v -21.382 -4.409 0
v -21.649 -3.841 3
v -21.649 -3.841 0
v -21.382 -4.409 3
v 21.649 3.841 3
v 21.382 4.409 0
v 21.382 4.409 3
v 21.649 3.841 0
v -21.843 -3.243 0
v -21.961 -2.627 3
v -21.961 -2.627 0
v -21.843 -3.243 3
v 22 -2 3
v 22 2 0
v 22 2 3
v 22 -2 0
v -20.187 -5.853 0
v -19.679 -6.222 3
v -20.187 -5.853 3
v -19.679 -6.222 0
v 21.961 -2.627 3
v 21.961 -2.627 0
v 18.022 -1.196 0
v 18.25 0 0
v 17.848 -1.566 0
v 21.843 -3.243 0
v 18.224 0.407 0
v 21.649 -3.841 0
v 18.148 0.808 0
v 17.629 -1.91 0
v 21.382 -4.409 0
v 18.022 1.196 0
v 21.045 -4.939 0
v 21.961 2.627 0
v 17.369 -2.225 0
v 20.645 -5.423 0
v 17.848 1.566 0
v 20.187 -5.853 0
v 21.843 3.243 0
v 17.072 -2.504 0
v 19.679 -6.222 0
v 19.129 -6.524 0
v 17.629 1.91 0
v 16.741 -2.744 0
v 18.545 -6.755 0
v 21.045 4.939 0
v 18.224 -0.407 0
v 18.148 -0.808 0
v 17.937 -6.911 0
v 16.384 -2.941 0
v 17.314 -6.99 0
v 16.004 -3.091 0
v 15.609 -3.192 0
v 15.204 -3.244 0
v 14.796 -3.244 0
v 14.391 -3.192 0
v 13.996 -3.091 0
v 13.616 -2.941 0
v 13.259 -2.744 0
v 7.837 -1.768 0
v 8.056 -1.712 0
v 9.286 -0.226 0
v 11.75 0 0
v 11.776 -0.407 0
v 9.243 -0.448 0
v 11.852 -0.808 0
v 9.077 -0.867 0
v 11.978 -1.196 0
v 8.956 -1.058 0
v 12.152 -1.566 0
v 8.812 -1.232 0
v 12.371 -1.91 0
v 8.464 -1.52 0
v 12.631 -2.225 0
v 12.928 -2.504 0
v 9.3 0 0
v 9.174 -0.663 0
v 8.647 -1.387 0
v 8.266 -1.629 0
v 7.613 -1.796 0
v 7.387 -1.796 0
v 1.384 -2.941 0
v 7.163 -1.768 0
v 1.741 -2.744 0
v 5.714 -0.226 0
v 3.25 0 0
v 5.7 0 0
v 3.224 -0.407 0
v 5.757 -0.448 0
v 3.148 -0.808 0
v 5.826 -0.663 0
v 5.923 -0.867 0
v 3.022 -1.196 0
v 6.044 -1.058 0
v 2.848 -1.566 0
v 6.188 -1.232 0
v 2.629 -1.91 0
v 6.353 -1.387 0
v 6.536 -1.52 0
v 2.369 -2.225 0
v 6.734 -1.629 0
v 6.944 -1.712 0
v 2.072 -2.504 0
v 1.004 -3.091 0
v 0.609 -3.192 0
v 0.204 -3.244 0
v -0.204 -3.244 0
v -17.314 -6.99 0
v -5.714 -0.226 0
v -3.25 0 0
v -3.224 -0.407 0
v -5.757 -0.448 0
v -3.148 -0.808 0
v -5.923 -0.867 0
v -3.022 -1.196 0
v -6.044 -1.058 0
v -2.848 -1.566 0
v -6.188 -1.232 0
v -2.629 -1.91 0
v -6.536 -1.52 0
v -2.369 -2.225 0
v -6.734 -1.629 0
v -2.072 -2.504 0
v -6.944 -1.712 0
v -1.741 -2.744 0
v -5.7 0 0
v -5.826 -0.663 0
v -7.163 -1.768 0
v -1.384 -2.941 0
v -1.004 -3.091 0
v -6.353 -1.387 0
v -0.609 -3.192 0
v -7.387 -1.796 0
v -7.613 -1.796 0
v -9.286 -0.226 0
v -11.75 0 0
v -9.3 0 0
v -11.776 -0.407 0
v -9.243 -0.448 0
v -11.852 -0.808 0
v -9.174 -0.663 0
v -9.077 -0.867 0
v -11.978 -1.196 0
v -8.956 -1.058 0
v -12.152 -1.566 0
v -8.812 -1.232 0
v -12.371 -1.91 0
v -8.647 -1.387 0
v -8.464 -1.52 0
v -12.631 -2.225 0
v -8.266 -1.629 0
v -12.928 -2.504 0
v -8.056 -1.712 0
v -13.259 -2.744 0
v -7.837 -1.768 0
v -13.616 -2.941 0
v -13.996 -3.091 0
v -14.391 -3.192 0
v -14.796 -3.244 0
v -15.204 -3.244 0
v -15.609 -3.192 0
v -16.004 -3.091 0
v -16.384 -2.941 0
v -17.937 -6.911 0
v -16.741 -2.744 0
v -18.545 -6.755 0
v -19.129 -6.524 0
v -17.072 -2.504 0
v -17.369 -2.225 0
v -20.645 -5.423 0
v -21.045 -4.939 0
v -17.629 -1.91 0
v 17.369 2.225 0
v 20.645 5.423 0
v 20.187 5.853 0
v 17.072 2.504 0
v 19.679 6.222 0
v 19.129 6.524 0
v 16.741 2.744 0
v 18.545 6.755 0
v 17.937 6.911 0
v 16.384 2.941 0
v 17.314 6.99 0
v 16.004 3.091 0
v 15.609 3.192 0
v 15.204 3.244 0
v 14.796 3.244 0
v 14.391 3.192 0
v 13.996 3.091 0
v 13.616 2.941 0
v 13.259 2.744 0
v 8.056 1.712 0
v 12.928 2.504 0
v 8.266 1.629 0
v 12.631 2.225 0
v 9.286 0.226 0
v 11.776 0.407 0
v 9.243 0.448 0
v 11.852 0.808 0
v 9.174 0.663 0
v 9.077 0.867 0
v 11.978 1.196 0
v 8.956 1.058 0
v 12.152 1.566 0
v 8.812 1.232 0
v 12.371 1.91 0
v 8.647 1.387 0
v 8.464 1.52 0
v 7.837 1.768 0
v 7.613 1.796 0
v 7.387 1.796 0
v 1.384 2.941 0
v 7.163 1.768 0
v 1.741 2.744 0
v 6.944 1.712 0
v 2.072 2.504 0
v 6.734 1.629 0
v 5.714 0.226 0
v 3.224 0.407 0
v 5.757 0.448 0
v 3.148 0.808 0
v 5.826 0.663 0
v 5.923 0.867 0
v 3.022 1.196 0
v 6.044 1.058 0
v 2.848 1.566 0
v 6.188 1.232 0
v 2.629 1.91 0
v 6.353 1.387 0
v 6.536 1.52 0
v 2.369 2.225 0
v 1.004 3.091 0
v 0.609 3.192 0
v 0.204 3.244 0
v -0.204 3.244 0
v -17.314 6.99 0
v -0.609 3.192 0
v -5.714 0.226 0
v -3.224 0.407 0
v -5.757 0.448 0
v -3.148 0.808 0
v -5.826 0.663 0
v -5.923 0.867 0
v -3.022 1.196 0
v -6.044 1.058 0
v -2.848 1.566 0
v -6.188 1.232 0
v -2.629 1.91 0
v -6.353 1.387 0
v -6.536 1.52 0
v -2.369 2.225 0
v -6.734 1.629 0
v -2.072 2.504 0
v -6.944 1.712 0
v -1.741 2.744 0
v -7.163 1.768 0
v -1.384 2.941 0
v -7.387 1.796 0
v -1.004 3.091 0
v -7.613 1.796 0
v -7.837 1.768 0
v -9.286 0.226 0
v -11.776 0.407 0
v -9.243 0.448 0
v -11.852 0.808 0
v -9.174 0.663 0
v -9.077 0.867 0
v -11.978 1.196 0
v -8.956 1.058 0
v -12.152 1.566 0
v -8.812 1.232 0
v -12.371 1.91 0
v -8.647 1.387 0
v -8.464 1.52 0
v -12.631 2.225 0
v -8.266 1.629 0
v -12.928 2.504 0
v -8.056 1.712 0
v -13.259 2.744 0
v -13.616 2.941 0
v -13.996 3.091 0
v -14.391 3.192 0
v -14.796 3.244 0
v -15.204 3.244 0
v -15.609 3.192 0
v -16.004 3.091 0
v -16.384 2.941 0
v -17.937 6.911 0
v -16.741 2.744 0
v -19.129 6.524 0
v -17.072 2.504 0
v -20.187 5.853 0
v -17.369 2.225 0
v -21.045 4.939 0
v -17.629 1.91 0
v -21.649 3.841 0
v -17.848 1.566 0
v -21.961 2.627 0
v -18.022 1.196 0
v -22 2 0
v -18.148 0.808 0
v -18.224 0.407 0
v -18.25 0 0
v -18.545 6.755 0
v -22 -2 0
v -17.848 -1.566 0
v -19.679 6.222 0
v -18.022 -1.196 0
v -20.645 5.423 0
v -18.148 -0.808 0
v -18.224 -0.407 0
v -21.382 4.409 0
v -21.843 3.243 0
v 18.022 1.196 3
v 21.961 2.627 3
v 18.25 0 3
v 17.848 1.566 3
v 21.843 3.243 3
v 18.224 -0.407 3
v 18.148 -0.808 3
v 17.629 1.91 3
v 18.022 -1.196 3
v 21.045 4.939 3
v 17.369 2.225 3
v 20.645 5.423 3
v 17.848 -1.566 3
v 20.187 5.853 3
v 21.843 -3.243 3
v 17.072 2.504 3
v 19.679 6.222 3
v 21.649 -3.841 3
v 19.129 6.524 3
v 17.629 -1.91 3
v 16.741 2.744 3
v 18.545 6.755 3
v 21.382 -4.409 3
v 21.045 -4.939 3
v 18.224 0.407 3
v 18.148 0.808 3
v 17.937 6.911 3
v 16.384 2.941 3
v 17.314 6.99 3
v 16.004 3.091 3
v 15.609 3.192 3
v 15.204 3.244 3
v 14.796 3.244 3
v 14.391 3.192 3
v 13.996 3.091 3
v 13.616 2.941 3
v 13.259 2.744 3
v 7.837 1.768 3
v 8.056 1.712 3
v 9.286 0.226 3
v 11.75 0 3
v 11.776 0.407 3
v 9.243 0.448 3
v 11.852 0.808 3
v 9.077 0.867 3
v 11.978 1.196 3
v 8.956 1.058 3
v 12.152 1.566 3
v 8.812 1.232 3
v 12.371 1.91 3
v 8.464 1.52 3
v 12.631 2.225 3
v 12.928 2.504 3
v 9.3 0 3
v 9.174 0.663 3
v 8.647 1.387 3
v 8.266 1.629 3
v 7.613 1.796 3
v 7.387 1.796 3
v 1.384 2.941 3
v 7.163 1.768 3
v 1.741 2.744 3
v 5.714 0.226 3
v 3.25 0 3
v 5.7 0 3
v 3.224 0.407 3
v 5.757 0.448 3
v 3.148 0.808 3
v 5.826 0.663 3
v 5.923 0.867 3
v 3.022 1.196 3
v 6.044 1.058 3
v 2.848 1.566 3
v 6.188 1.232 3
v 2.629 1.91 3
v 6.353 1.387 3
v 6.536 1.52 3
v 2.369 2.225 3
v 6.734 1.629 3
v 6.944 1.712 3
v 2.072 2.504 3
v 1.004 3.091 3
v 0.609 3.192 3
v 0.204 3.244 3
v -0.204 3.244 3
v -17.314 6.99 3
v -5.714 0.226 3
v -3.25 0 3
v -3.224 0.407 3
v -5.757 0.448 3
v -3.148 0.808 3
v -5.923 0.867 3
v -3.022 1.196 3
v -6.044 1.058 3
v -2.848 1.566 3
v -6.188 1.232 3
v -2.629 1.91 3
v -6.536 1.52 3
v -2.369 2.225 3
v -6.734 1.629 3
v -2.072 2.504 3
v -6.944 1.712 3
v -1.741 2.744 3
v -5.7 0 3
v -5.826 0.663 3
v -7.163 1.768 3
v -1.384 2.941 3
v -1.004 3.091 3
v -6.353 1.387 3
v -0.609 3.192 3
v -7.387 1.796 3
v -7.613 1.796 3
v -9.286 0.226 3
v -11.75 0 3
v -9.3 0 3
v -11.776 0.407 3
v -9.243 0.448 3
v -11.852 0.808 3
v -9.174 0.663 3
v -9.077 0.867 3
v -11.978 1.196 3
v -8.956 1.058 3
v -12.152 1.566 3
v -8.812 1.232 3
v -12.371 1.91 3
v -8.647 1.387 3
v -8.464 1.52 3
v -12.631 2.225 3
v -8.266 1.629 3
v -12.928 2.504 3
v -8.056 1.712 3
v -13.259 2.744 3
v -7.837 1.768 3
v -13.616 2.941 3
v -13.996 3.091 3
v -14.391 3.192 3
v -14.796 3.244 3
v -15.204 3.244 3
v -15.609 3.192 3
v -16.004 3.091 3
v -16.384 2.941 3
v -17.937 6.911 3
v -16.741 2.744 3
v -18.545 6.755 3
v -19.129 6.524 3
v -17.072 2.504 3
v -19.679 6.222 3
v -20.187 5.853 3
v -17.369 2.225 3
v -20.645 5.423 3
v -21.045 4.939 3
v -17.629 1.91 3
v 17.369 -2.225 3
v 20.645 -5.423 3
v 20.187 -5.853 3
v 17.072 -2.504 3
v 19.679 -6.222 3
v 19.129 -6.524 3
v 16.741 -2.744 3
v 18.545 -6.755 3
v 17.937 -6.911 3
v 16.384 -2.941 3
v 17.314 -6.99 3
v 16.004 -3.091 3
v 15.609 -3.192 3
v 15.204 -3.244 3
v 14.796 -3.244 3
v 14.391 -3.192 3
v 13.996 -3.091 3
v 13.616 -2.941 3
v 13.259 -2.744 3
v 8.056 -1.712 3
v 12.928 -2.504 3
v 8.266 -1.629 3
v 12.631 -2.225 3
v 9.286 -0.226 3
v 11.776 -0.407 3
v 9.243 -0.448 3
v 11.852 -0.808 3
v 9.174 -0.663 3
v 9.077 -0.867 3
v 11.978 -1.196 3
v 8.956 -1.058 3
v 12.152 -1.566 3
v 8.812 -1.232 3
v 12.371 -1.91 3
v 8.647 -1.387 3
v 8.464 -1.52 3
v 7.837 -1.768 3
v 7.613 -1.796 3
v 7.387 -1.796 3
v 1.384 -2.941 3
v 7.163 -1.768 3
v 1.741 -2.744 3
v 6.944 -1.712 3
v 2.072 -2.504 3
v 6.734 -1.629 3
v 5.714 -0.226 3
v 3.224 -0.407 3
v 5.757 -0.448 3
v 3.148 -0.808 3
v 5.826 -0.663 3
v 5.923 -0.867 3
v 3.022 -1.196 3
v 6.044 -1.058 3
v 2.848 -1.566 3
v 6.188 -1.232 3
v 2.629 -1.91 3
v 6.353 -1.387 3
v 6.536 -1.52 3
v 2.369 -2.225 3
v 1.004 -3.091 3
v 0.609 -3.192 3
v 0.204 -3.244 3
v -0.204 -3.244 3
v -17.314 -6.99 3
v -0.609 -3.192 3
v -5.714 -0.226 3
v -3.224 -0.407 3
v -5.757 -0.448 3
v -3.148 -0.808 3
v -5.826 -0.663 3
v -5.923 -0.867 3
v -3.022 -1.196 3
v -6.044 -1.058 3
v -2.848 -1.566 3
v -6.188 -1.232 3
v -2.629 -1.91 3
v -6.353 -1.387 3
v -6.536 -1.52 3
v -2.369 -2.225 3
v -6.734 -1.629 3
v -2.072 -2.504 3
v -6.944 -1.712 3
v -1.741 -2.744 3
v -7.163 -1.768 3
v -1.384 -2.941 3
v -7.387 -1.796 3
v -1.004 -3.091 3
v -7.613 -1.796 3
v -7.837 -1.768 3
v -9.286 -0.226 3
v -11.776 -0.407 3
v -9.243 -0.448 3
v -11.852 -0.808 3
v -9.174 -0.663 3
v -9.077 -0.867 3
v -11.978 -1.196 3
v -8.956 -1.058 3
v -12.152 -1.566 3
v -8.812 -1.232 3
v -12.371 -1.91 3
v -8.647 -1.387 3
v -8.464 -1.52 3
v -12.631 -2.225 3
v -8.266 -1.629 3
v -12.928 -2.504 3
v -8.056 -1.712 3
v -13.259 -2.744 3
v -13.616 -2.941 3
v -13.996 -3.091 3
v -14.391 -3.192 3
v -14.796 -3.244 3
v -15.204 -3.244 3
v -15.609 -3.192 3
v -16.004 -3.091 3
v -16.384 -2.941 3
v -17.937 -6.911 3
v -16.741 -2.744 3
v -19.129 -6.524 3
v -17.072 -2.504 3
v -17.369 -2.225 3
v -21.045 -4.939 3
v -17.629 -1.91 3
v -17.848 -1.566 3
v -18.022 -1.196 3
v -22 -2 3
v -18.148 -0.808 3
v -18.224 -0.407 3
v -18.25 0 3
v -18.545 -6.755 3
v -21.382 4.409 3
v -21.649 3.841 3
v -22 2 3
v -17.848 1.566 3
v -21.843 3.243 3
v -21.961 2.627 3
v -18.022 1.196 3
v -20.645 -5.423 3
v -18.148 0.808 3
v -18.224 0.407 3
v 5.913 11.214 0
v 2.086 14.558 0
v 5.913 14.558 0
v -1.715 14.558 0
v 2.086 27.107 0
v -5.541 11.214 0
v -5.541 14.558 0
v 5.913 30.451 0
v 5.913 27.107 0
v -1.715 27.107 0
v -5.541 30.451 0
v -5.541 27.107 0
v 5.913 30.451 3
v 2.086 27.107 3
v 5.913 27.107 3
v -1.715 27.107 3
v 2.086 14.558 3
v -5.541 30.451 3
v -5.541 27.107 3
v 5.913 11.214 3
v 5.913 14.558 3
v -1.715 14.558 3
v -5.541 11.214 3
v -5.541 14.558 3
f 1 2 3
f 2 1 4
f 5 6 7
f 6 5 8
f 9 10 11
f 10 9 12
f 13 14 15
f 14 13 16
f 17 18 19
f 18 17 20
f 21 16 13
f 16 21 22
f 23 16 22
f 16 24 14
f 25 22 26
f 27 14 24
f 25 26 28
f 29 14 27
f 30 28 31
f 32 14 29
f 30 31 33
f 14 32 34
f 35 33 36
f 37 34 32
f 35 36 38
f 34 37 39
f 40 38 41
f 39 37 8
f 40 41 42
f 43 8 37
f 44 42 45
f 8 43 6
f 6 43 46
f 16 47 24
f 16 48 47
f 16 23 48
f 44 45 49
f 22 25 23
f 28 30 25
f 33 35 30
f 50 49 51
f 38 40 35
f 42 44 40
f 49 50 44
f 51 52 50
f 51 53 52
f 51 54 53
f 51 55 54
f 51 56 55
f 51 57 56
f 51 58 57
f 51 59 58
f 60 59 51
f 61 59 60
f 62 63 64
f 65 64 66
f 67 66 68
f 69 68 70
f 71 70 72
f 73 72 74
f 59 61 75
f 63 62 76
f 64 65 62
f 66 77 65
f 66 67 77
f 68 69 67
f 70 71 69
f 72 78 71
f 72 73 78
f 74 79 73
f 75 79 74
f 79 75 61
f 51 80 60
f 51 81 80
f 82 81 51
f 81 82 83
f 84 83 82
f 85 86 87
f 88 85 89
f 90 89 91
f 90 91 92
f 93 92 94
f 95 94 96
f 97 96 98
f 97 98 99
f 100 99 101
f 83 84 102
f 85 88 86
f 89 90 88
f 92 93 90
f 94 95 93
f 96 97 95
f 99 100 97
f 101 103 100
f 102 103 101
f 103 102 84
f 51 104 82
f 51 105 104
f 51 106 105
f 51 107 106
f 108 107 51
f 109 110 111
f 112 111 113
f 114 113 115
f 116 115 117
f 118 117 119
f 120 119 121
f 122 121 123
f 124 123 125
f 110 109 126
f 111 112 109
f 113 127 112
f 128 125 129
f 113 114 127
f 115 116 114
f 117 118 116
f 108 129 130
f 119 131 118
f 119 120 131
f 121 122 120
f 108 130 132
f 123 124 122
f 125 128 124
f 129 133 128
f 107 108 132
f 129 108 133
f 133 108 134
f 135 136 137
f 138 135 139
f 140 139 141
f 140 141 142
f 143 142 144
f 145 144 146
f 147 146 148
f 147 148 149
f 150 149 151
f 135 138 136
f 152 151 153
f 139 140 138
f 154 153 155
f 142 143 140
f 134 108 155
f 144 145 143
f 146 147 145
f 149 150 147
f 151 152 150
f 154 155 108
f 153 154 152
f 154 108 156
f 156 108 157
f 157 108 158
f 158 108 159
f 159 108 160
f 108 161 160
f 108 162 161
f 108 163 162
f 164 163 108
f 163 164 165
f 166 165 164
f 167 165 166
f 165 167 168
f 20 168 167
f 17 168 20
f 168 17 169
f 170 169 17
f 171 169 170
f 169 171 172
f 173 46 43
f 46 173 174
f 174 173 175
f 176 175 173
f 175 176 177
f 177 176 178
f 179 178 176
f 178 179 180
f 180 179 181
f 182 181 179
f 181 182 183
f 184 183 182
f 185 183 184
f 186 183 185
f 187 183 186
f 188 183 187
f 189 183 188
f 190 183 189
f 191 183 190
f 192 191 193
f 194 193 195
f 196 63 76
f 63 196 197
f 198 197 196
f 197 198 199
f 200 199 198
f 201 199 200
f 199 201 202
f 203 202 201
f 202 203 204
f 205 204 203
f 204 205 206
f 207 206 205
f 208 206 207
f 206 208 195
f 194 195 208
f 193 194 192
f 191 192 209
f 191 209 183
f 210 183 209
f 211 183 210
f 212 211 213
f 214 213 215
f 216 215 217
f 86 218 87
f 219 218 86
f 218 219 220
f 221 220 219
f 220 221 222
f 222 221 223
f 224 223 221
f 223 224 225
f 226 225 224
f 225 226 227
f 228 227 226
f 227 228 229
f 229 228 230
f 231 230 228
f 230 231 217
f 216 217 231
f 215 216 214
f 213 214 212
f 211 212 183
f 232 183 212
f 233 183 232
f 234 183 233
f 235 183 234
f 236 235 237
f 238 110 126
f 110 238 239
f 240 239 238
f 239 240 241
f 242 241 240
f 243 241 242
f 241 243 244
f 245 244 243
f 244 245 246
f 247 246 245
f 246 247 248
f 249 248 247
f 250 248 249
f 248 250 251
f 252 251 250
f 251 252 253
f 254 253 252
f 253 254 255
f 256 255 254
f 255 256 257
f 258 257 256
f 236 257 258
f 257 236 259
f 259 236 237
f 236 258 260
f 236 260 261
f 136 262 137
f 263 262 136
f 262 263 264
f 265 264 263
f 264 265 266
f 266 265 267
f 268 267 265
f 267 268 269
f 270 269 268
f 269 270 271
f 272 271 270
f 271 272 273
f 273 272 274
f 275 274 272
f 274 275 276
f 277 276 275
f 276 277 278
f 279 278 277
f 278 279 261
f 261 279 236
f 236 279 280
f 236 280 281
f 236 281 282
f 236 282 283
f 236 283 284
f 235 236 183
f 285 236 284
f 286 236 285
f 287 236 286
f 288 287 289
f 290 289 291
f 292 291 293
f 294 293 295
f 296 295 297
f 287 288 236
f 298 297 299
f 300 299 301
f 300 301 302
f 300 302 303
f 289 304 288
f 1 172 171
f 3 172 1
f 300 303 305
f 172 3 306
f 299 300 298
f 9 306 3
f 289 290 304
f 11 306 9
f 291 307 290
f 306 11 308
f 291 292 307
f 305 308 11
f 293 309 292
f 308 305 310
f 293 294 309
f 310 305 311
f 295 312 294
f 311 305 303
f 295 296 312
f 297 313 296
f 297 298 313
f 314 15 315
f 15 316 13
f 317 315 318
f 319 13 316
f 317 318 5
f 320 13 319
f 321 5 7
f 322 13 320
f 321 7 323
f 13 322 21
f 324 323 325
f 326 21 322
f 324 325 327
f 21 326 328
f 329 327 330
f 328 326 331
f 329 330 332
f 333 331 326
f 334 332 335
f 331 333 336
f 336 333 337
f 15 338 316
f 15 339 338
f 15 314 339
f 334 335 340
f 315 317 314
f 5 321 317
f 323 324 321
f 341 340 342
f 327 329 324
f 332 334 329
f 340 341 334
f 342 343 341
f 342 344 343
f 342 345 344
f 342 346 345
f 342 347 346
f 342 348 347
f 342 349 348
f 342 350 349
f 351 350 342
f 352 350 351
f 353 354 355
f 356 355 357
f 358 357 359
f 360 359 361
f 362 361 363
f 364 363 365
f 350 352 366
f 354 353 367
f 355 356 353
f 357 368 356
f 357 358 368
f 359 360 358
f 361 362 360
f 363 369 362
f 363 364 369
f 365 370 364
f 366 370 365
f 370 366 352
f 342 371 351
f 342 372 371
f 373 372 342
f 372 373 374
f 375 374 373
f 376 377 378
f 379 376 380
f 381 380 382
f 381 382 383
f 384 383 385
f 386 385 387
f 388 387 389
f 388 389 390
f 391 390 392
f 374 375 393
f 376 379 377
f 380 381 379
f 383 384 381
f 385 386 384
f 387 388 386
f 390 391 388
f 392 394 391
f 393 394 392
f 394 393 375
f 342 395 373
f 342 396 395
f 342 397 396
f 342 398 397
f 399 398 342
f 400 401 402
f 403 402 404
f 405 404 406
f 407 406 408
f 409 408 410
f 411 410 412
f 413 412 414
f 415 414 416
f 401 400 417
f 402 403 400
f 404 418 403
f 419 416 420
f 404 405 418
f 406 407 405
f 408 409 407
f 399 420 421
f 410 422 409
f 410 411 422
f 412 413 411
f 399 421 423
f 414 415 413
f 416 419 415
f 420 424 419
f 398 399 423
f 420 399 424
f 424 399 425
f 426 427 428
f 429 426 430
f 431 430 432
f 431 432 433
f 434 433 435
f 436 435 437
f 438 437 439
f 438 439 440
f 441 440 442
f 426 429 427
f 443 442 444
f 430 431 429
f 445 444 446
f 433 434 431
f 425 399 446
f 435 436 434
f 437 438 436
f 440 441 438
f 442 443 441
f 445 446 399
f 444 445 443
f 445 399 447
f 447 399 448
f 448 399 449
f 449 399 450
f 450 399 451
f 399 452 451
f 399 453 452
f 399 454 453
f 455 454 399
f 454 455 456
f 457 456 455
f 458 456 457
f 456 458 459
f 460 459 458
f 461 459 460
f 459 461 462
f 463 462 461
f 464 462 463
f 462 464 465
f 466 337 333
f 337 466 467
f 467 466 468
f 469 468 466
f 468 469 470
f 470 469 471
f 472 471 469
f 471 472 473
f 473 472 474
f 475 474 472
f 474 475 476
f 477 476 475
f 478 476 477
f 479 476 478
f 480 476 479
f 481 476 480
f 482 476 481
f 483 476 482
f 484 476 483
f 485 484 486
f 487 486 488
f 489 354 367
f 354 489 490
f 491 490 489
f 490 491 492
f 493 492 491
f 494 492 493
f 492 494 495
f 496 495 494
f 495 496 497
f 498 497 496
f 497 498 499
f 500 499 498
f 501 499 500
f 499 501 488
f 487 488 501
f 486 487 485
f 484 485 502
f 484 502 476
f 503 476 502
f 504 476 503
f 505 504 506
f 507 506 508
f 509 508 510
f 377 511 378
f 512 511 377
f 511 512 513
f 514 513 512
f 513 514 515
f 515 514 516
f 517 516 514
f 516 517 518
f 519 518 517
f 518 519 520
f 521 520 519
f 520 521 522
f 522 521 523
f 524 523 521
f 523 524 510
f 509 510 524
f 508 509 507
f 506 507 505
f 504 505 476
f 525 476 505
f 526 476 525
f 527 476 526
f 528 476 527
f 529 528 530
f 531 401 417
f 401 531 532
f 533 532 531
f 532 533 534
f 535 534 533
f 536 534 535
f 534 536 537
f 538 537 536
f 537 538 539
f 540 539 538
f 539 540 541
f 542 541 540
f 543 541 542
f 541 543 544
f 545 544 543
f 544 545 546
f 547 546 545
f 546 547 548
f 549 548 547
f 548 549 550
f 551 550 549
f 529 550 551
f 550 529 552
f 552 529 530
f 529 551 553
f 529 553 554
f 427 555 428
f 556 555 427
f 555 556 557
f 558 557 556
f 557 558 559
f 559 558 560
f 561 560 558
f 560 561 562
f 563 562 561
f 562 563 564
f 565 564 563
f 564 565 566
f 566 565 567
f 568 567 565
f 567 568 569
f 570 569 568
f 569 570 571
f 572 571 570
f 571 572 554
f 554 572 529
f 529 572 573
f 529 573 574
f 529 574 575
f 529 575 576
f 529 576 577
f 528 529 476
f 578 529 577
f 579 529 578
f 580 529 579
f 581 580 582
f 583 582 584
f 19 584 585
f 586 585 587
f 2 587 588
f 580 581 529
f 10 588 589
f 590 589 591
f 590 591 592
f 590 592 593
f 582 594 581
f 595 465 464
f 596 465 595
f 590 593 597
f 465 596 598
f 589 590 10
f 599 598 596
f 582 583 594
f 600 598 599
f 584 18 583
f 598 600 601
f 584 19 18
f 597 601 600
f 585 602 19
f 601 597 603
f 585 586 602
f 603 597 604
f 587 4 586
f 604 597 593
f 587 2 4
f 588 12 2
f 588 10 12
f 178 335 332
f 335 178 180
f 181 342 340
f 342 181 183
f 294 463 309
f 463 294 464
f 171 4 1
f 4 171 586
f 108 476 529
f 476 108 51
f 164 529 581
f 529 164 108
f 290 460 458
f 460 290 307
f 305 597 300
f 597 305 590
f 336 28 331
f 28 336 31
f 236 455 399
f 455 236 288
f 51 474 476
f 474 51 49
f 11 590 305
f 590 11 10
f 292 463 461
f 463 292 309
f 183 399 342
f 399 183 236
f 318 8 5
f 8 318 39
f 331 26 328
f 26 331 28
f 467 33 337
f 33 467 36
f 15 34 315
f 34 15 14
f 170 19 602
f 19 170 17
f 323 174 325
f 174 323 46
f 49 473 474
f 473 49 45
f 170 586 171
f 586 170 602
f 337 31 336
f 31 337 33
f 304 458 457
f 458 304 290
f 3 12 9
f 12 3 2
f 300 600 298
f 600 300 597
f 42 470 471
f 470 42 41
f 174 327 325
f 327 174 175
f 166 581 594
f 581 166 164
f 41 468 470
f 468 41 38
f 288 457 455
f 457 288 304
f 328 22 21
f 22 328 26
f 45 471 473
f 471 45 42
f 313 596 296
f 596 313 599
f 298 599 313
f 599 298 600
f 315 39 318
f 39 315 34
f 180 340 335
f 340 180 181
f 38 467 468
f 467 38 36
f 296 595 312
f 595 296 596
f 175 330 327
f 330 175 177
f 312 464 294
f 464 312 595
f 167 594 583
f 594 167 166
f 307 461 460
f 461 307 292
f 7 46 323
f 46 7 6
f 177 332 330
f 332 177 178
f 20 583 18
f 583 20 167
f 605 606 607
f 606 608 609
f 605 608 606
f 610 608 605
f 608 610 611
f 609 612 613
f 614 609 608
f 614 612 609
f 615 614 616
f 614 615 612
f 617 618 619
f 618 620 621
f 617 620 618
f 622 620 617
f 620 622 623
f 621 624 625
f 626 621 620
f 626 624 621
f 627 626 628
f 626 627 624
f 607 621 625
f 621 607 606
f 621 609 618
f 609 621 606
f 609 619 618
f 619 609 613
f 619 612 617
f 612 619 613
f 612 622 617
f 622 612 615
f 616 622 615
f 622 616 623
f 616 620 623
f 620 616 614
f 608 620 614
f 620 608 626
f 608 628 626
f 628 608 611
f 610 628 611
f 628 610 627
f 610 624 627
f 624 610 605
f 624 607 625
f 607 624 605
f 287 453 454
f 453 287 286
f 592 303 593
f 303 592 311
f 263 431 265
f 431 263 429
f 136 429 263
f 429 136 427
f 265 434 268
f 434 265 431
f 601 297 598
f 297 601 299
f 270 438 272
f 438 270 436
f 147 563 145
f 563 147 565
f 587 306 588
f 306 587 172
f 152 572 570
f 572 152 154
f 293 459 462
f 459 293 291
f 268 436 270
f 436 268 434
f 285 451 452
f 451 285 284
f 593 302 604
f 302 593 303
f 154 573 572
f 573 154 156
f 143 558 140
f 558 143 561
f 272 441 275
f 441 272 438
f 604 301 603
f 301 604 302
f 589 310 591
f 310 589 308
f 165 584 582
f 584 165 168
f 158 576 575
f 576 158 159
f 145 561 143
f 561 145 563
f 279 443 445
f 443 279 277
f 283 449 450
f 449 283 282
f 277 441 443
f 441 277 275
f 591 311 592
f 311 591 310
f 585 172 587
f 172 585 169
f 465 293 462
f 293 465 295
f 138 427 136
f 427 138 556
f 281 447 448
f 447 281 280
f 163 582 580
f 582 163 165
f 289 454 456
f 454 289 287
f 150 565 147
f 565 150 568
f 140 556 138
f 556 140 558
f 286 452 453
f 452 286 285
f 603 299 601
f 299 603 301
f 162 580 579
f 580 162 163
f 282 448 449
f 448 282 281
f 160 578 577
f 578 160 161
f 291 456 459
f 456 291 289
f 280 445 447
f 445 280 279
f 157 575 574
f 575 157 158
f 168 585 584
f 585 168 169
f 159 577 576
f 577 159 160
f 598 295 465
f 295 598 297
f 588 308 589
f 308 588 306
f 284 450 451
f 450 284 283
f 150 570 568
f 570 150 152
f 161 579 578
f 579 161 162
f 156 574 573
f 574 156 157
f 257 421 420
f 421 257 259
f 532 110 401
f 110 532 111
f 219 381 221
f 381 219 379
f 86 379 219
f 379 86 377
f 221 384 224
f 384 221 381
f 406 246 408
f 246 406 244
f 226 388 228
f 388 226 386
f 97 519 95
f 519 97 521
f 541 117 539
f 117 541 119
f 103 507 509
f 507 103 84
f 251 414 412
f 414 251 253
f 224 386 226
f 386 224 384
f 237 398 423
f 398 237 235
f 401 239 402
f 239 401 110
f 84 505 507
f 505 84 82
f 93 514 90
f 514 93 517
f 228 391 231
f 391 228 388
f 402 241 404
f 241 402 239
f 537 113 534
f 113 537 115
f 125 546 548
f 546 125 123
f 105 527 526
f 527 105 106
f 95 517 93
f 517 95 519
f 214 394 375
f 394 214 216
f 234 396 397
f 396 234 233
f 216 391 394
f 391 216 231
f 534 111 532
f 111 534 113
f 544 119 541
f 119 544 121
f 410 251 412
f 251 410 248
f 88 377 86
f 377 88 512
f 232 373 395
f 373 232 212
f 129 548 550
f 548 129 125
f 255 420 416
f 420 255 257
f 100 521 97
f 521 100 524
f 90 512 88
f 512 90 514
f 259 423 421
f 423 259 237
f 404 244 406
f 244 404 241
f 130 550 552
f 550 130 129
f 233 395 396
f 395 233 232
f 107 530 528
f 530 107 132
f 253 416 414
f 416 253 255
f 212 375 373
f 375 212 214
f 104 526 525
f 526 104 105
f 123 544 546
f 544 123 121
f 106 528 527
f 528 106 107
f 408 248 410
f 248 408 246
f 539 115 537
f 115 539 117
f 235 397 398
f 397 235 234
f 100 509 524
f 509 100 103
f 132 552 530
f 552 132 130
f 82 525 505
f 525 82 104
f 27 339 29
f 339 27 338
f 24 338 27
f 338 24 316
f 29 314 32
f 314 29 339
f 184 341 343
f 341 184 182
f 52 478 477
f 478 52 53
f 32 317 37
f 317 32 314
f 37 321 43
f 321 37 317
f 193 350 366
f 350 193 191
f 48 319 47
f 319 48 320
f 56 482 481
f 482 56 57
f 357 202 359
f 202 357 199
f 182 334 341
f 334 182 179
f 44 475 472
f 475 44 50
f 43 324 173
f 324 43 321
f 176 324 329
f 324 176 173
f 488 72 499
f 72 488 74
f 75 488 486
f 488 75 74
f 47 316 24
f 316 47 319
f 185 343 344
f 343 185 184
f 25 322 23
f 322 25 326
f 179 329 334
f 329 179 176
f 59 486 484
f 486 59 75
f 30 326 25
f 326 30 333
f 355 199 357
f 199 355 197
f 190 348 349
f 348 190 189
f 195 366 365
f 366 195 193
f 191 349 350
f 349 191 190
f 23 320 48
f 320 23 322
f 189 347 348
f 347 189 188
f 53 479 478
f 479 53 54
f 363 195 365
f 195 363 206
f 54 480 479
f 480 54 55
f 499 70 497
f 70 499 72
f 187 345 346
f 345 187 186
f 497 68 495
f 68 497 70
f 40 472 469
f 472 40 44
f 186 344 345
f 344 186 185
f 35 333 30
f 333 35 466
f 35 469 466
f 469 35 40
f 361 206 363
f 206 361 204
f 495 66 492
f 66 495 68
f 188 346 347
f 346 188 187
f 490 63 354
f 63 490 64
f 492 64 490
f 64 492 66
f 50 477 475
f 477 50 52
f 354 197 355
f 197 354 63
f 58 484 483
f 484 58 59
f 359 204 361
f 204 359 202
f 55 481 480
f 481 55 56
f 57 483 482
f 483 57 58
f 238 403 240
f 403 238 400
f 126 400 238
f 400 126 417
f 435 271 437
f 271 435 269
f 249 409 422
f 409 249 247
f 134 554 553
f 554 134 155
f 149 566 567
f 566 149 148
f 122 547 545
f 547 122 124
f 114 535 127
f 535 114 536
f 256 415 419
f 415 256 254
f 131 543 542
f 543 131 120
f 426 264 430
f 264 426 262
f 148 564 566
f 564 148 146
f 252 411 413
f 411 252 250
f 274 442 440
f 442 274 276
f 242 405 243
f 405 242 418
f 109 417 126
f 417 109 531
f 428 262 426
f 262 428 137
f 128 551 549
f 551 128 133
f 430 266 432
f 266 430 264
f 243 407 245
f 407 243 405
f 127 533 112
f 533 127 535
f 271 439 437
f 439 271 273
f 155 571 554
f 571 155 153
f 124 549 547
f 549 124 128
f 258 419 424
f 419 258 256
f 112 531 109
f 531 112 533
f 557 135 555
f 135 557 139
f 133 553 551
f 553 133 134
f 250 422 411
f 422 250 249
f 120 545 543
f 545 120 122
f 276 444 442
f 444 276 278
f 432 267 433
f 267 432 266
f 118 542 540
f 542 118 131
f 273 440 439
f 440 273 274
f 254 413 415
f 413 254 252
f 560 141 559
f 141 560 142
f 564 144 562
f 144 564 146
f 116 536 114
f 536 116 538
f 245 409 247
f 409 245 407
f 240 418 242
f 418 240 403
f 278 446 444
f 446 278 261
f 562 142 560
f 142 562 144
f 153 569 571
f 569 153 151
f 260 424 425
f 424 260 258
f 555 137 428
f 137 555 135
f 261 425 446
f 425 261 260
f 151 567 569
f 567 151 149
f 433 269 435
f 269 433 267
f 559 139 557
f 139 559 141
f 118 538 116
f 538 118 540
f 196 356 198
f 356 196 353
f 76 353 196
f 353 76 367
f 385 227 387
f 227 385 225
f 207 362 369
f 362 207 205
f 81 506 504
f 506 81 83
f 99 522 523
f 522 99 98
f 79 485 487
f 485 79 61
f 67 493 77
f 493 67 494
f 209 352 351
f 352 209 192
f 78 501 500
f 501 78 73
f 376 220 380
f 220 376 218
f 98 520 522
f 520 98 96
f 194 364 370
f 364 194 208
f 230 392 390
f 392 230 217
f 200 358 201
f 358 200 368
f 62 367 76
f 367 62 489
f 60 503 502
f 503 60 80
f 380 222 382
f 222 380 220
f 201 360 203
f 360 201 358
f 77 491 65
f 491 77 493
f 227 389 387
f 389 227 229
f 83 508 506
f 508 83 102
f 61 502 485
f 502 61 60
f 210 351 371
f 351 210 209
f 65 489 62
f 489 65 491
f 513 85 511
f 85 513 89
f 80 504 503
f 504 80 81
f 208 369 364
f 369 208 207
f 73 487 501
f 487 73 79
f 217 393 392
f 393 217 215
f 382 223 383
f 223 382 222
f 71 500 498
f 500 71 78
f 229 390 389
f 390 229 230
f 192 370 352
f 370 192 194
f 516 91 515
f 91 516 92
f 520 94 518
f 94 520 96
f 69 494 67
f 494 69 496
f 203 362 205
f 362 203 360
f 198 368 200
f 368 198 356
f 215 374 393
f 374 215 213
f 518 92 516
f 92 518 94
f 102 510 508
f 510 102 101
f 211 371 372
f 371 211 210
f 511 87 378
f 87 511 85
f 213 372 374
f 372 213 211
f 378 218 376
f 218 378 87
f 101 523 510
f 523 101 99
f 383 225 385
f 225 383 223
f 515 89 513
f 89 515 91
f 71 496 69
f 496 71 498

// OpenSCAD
$fn = 50;


difference() {
	union() {
		hull() {
			translate(v = [-17.0000000000, 2.0000000000, 0]) {
				cylinder(h = 3, r = 5);
			}
			translate(v = [17.0000000000, 2.0000000000, 0]) {
				cylinder(h = 3, r = 5);
			}
			translate(v = [-17.0000000000, -2.0000000000, 0]) {
				cylinder(h = 3, r = 5);
			}
			translate(v = [17.0000000000, -2.0000000000, 0]) {
				cylinder(h = 3, r = 5);
			}
		}
		translate(v = [0, 30.0000000000, 0]) {
			linear_extrude(height = 3) {
				text(font = "DejaVu Sans Mono:style=Bold", halign = "center", size = 19.0000000000, text = "I", valign = "top");
			}
		}
	}
	union() {
		translate(v = [-15.0000000000, 0.0000000000, 0]) {
			translate(v = [0, 0, -100]) {
				cylinder(h = 200, r = 3.2500000000);
			}
		}
		translate(v = [0, 0, -100]) {
			cylinder(h = 200, r = 3.2500000000);
		}
		translate(v = [15.0000000000, 0.0000000000, 0]) {
			translate(v = [0, 0, -100]) {
				cylinder(h = 200, r = 3.2500000000);
			}
		}
		translate(v = [-15.0000000000, 0.0000000000, 0]) {
			translate(v = [0, 0, -100]) {
				cylinder(h = 200, r = 1.8000000000);
			}
		}
		translate(v = [-7.5000000000, 0.0000000000, 0]) {
			translate(v = [0, 0, -100]) {
				cylinder(h = 200, r = 1.8000000000);
			}
		}
		translate(v = [0, 0, -100]) {
			cylinder(h = 200, r = 1.8000000000);
		}
		translate(v = [7.5000000000, 0.0000000000, 0]) {
			translate(v = [0, 0, -100]) {
				cylinder(h = 200, r = 1.8000000000);
			}
		}
		translate(v = [15.0000000000, 0.0000000000, 0]) {
			translate(v = [0, 0, -100]) {
				cylinder(h = 200, r = 1.8000000000);
			}
		}
	}
}
